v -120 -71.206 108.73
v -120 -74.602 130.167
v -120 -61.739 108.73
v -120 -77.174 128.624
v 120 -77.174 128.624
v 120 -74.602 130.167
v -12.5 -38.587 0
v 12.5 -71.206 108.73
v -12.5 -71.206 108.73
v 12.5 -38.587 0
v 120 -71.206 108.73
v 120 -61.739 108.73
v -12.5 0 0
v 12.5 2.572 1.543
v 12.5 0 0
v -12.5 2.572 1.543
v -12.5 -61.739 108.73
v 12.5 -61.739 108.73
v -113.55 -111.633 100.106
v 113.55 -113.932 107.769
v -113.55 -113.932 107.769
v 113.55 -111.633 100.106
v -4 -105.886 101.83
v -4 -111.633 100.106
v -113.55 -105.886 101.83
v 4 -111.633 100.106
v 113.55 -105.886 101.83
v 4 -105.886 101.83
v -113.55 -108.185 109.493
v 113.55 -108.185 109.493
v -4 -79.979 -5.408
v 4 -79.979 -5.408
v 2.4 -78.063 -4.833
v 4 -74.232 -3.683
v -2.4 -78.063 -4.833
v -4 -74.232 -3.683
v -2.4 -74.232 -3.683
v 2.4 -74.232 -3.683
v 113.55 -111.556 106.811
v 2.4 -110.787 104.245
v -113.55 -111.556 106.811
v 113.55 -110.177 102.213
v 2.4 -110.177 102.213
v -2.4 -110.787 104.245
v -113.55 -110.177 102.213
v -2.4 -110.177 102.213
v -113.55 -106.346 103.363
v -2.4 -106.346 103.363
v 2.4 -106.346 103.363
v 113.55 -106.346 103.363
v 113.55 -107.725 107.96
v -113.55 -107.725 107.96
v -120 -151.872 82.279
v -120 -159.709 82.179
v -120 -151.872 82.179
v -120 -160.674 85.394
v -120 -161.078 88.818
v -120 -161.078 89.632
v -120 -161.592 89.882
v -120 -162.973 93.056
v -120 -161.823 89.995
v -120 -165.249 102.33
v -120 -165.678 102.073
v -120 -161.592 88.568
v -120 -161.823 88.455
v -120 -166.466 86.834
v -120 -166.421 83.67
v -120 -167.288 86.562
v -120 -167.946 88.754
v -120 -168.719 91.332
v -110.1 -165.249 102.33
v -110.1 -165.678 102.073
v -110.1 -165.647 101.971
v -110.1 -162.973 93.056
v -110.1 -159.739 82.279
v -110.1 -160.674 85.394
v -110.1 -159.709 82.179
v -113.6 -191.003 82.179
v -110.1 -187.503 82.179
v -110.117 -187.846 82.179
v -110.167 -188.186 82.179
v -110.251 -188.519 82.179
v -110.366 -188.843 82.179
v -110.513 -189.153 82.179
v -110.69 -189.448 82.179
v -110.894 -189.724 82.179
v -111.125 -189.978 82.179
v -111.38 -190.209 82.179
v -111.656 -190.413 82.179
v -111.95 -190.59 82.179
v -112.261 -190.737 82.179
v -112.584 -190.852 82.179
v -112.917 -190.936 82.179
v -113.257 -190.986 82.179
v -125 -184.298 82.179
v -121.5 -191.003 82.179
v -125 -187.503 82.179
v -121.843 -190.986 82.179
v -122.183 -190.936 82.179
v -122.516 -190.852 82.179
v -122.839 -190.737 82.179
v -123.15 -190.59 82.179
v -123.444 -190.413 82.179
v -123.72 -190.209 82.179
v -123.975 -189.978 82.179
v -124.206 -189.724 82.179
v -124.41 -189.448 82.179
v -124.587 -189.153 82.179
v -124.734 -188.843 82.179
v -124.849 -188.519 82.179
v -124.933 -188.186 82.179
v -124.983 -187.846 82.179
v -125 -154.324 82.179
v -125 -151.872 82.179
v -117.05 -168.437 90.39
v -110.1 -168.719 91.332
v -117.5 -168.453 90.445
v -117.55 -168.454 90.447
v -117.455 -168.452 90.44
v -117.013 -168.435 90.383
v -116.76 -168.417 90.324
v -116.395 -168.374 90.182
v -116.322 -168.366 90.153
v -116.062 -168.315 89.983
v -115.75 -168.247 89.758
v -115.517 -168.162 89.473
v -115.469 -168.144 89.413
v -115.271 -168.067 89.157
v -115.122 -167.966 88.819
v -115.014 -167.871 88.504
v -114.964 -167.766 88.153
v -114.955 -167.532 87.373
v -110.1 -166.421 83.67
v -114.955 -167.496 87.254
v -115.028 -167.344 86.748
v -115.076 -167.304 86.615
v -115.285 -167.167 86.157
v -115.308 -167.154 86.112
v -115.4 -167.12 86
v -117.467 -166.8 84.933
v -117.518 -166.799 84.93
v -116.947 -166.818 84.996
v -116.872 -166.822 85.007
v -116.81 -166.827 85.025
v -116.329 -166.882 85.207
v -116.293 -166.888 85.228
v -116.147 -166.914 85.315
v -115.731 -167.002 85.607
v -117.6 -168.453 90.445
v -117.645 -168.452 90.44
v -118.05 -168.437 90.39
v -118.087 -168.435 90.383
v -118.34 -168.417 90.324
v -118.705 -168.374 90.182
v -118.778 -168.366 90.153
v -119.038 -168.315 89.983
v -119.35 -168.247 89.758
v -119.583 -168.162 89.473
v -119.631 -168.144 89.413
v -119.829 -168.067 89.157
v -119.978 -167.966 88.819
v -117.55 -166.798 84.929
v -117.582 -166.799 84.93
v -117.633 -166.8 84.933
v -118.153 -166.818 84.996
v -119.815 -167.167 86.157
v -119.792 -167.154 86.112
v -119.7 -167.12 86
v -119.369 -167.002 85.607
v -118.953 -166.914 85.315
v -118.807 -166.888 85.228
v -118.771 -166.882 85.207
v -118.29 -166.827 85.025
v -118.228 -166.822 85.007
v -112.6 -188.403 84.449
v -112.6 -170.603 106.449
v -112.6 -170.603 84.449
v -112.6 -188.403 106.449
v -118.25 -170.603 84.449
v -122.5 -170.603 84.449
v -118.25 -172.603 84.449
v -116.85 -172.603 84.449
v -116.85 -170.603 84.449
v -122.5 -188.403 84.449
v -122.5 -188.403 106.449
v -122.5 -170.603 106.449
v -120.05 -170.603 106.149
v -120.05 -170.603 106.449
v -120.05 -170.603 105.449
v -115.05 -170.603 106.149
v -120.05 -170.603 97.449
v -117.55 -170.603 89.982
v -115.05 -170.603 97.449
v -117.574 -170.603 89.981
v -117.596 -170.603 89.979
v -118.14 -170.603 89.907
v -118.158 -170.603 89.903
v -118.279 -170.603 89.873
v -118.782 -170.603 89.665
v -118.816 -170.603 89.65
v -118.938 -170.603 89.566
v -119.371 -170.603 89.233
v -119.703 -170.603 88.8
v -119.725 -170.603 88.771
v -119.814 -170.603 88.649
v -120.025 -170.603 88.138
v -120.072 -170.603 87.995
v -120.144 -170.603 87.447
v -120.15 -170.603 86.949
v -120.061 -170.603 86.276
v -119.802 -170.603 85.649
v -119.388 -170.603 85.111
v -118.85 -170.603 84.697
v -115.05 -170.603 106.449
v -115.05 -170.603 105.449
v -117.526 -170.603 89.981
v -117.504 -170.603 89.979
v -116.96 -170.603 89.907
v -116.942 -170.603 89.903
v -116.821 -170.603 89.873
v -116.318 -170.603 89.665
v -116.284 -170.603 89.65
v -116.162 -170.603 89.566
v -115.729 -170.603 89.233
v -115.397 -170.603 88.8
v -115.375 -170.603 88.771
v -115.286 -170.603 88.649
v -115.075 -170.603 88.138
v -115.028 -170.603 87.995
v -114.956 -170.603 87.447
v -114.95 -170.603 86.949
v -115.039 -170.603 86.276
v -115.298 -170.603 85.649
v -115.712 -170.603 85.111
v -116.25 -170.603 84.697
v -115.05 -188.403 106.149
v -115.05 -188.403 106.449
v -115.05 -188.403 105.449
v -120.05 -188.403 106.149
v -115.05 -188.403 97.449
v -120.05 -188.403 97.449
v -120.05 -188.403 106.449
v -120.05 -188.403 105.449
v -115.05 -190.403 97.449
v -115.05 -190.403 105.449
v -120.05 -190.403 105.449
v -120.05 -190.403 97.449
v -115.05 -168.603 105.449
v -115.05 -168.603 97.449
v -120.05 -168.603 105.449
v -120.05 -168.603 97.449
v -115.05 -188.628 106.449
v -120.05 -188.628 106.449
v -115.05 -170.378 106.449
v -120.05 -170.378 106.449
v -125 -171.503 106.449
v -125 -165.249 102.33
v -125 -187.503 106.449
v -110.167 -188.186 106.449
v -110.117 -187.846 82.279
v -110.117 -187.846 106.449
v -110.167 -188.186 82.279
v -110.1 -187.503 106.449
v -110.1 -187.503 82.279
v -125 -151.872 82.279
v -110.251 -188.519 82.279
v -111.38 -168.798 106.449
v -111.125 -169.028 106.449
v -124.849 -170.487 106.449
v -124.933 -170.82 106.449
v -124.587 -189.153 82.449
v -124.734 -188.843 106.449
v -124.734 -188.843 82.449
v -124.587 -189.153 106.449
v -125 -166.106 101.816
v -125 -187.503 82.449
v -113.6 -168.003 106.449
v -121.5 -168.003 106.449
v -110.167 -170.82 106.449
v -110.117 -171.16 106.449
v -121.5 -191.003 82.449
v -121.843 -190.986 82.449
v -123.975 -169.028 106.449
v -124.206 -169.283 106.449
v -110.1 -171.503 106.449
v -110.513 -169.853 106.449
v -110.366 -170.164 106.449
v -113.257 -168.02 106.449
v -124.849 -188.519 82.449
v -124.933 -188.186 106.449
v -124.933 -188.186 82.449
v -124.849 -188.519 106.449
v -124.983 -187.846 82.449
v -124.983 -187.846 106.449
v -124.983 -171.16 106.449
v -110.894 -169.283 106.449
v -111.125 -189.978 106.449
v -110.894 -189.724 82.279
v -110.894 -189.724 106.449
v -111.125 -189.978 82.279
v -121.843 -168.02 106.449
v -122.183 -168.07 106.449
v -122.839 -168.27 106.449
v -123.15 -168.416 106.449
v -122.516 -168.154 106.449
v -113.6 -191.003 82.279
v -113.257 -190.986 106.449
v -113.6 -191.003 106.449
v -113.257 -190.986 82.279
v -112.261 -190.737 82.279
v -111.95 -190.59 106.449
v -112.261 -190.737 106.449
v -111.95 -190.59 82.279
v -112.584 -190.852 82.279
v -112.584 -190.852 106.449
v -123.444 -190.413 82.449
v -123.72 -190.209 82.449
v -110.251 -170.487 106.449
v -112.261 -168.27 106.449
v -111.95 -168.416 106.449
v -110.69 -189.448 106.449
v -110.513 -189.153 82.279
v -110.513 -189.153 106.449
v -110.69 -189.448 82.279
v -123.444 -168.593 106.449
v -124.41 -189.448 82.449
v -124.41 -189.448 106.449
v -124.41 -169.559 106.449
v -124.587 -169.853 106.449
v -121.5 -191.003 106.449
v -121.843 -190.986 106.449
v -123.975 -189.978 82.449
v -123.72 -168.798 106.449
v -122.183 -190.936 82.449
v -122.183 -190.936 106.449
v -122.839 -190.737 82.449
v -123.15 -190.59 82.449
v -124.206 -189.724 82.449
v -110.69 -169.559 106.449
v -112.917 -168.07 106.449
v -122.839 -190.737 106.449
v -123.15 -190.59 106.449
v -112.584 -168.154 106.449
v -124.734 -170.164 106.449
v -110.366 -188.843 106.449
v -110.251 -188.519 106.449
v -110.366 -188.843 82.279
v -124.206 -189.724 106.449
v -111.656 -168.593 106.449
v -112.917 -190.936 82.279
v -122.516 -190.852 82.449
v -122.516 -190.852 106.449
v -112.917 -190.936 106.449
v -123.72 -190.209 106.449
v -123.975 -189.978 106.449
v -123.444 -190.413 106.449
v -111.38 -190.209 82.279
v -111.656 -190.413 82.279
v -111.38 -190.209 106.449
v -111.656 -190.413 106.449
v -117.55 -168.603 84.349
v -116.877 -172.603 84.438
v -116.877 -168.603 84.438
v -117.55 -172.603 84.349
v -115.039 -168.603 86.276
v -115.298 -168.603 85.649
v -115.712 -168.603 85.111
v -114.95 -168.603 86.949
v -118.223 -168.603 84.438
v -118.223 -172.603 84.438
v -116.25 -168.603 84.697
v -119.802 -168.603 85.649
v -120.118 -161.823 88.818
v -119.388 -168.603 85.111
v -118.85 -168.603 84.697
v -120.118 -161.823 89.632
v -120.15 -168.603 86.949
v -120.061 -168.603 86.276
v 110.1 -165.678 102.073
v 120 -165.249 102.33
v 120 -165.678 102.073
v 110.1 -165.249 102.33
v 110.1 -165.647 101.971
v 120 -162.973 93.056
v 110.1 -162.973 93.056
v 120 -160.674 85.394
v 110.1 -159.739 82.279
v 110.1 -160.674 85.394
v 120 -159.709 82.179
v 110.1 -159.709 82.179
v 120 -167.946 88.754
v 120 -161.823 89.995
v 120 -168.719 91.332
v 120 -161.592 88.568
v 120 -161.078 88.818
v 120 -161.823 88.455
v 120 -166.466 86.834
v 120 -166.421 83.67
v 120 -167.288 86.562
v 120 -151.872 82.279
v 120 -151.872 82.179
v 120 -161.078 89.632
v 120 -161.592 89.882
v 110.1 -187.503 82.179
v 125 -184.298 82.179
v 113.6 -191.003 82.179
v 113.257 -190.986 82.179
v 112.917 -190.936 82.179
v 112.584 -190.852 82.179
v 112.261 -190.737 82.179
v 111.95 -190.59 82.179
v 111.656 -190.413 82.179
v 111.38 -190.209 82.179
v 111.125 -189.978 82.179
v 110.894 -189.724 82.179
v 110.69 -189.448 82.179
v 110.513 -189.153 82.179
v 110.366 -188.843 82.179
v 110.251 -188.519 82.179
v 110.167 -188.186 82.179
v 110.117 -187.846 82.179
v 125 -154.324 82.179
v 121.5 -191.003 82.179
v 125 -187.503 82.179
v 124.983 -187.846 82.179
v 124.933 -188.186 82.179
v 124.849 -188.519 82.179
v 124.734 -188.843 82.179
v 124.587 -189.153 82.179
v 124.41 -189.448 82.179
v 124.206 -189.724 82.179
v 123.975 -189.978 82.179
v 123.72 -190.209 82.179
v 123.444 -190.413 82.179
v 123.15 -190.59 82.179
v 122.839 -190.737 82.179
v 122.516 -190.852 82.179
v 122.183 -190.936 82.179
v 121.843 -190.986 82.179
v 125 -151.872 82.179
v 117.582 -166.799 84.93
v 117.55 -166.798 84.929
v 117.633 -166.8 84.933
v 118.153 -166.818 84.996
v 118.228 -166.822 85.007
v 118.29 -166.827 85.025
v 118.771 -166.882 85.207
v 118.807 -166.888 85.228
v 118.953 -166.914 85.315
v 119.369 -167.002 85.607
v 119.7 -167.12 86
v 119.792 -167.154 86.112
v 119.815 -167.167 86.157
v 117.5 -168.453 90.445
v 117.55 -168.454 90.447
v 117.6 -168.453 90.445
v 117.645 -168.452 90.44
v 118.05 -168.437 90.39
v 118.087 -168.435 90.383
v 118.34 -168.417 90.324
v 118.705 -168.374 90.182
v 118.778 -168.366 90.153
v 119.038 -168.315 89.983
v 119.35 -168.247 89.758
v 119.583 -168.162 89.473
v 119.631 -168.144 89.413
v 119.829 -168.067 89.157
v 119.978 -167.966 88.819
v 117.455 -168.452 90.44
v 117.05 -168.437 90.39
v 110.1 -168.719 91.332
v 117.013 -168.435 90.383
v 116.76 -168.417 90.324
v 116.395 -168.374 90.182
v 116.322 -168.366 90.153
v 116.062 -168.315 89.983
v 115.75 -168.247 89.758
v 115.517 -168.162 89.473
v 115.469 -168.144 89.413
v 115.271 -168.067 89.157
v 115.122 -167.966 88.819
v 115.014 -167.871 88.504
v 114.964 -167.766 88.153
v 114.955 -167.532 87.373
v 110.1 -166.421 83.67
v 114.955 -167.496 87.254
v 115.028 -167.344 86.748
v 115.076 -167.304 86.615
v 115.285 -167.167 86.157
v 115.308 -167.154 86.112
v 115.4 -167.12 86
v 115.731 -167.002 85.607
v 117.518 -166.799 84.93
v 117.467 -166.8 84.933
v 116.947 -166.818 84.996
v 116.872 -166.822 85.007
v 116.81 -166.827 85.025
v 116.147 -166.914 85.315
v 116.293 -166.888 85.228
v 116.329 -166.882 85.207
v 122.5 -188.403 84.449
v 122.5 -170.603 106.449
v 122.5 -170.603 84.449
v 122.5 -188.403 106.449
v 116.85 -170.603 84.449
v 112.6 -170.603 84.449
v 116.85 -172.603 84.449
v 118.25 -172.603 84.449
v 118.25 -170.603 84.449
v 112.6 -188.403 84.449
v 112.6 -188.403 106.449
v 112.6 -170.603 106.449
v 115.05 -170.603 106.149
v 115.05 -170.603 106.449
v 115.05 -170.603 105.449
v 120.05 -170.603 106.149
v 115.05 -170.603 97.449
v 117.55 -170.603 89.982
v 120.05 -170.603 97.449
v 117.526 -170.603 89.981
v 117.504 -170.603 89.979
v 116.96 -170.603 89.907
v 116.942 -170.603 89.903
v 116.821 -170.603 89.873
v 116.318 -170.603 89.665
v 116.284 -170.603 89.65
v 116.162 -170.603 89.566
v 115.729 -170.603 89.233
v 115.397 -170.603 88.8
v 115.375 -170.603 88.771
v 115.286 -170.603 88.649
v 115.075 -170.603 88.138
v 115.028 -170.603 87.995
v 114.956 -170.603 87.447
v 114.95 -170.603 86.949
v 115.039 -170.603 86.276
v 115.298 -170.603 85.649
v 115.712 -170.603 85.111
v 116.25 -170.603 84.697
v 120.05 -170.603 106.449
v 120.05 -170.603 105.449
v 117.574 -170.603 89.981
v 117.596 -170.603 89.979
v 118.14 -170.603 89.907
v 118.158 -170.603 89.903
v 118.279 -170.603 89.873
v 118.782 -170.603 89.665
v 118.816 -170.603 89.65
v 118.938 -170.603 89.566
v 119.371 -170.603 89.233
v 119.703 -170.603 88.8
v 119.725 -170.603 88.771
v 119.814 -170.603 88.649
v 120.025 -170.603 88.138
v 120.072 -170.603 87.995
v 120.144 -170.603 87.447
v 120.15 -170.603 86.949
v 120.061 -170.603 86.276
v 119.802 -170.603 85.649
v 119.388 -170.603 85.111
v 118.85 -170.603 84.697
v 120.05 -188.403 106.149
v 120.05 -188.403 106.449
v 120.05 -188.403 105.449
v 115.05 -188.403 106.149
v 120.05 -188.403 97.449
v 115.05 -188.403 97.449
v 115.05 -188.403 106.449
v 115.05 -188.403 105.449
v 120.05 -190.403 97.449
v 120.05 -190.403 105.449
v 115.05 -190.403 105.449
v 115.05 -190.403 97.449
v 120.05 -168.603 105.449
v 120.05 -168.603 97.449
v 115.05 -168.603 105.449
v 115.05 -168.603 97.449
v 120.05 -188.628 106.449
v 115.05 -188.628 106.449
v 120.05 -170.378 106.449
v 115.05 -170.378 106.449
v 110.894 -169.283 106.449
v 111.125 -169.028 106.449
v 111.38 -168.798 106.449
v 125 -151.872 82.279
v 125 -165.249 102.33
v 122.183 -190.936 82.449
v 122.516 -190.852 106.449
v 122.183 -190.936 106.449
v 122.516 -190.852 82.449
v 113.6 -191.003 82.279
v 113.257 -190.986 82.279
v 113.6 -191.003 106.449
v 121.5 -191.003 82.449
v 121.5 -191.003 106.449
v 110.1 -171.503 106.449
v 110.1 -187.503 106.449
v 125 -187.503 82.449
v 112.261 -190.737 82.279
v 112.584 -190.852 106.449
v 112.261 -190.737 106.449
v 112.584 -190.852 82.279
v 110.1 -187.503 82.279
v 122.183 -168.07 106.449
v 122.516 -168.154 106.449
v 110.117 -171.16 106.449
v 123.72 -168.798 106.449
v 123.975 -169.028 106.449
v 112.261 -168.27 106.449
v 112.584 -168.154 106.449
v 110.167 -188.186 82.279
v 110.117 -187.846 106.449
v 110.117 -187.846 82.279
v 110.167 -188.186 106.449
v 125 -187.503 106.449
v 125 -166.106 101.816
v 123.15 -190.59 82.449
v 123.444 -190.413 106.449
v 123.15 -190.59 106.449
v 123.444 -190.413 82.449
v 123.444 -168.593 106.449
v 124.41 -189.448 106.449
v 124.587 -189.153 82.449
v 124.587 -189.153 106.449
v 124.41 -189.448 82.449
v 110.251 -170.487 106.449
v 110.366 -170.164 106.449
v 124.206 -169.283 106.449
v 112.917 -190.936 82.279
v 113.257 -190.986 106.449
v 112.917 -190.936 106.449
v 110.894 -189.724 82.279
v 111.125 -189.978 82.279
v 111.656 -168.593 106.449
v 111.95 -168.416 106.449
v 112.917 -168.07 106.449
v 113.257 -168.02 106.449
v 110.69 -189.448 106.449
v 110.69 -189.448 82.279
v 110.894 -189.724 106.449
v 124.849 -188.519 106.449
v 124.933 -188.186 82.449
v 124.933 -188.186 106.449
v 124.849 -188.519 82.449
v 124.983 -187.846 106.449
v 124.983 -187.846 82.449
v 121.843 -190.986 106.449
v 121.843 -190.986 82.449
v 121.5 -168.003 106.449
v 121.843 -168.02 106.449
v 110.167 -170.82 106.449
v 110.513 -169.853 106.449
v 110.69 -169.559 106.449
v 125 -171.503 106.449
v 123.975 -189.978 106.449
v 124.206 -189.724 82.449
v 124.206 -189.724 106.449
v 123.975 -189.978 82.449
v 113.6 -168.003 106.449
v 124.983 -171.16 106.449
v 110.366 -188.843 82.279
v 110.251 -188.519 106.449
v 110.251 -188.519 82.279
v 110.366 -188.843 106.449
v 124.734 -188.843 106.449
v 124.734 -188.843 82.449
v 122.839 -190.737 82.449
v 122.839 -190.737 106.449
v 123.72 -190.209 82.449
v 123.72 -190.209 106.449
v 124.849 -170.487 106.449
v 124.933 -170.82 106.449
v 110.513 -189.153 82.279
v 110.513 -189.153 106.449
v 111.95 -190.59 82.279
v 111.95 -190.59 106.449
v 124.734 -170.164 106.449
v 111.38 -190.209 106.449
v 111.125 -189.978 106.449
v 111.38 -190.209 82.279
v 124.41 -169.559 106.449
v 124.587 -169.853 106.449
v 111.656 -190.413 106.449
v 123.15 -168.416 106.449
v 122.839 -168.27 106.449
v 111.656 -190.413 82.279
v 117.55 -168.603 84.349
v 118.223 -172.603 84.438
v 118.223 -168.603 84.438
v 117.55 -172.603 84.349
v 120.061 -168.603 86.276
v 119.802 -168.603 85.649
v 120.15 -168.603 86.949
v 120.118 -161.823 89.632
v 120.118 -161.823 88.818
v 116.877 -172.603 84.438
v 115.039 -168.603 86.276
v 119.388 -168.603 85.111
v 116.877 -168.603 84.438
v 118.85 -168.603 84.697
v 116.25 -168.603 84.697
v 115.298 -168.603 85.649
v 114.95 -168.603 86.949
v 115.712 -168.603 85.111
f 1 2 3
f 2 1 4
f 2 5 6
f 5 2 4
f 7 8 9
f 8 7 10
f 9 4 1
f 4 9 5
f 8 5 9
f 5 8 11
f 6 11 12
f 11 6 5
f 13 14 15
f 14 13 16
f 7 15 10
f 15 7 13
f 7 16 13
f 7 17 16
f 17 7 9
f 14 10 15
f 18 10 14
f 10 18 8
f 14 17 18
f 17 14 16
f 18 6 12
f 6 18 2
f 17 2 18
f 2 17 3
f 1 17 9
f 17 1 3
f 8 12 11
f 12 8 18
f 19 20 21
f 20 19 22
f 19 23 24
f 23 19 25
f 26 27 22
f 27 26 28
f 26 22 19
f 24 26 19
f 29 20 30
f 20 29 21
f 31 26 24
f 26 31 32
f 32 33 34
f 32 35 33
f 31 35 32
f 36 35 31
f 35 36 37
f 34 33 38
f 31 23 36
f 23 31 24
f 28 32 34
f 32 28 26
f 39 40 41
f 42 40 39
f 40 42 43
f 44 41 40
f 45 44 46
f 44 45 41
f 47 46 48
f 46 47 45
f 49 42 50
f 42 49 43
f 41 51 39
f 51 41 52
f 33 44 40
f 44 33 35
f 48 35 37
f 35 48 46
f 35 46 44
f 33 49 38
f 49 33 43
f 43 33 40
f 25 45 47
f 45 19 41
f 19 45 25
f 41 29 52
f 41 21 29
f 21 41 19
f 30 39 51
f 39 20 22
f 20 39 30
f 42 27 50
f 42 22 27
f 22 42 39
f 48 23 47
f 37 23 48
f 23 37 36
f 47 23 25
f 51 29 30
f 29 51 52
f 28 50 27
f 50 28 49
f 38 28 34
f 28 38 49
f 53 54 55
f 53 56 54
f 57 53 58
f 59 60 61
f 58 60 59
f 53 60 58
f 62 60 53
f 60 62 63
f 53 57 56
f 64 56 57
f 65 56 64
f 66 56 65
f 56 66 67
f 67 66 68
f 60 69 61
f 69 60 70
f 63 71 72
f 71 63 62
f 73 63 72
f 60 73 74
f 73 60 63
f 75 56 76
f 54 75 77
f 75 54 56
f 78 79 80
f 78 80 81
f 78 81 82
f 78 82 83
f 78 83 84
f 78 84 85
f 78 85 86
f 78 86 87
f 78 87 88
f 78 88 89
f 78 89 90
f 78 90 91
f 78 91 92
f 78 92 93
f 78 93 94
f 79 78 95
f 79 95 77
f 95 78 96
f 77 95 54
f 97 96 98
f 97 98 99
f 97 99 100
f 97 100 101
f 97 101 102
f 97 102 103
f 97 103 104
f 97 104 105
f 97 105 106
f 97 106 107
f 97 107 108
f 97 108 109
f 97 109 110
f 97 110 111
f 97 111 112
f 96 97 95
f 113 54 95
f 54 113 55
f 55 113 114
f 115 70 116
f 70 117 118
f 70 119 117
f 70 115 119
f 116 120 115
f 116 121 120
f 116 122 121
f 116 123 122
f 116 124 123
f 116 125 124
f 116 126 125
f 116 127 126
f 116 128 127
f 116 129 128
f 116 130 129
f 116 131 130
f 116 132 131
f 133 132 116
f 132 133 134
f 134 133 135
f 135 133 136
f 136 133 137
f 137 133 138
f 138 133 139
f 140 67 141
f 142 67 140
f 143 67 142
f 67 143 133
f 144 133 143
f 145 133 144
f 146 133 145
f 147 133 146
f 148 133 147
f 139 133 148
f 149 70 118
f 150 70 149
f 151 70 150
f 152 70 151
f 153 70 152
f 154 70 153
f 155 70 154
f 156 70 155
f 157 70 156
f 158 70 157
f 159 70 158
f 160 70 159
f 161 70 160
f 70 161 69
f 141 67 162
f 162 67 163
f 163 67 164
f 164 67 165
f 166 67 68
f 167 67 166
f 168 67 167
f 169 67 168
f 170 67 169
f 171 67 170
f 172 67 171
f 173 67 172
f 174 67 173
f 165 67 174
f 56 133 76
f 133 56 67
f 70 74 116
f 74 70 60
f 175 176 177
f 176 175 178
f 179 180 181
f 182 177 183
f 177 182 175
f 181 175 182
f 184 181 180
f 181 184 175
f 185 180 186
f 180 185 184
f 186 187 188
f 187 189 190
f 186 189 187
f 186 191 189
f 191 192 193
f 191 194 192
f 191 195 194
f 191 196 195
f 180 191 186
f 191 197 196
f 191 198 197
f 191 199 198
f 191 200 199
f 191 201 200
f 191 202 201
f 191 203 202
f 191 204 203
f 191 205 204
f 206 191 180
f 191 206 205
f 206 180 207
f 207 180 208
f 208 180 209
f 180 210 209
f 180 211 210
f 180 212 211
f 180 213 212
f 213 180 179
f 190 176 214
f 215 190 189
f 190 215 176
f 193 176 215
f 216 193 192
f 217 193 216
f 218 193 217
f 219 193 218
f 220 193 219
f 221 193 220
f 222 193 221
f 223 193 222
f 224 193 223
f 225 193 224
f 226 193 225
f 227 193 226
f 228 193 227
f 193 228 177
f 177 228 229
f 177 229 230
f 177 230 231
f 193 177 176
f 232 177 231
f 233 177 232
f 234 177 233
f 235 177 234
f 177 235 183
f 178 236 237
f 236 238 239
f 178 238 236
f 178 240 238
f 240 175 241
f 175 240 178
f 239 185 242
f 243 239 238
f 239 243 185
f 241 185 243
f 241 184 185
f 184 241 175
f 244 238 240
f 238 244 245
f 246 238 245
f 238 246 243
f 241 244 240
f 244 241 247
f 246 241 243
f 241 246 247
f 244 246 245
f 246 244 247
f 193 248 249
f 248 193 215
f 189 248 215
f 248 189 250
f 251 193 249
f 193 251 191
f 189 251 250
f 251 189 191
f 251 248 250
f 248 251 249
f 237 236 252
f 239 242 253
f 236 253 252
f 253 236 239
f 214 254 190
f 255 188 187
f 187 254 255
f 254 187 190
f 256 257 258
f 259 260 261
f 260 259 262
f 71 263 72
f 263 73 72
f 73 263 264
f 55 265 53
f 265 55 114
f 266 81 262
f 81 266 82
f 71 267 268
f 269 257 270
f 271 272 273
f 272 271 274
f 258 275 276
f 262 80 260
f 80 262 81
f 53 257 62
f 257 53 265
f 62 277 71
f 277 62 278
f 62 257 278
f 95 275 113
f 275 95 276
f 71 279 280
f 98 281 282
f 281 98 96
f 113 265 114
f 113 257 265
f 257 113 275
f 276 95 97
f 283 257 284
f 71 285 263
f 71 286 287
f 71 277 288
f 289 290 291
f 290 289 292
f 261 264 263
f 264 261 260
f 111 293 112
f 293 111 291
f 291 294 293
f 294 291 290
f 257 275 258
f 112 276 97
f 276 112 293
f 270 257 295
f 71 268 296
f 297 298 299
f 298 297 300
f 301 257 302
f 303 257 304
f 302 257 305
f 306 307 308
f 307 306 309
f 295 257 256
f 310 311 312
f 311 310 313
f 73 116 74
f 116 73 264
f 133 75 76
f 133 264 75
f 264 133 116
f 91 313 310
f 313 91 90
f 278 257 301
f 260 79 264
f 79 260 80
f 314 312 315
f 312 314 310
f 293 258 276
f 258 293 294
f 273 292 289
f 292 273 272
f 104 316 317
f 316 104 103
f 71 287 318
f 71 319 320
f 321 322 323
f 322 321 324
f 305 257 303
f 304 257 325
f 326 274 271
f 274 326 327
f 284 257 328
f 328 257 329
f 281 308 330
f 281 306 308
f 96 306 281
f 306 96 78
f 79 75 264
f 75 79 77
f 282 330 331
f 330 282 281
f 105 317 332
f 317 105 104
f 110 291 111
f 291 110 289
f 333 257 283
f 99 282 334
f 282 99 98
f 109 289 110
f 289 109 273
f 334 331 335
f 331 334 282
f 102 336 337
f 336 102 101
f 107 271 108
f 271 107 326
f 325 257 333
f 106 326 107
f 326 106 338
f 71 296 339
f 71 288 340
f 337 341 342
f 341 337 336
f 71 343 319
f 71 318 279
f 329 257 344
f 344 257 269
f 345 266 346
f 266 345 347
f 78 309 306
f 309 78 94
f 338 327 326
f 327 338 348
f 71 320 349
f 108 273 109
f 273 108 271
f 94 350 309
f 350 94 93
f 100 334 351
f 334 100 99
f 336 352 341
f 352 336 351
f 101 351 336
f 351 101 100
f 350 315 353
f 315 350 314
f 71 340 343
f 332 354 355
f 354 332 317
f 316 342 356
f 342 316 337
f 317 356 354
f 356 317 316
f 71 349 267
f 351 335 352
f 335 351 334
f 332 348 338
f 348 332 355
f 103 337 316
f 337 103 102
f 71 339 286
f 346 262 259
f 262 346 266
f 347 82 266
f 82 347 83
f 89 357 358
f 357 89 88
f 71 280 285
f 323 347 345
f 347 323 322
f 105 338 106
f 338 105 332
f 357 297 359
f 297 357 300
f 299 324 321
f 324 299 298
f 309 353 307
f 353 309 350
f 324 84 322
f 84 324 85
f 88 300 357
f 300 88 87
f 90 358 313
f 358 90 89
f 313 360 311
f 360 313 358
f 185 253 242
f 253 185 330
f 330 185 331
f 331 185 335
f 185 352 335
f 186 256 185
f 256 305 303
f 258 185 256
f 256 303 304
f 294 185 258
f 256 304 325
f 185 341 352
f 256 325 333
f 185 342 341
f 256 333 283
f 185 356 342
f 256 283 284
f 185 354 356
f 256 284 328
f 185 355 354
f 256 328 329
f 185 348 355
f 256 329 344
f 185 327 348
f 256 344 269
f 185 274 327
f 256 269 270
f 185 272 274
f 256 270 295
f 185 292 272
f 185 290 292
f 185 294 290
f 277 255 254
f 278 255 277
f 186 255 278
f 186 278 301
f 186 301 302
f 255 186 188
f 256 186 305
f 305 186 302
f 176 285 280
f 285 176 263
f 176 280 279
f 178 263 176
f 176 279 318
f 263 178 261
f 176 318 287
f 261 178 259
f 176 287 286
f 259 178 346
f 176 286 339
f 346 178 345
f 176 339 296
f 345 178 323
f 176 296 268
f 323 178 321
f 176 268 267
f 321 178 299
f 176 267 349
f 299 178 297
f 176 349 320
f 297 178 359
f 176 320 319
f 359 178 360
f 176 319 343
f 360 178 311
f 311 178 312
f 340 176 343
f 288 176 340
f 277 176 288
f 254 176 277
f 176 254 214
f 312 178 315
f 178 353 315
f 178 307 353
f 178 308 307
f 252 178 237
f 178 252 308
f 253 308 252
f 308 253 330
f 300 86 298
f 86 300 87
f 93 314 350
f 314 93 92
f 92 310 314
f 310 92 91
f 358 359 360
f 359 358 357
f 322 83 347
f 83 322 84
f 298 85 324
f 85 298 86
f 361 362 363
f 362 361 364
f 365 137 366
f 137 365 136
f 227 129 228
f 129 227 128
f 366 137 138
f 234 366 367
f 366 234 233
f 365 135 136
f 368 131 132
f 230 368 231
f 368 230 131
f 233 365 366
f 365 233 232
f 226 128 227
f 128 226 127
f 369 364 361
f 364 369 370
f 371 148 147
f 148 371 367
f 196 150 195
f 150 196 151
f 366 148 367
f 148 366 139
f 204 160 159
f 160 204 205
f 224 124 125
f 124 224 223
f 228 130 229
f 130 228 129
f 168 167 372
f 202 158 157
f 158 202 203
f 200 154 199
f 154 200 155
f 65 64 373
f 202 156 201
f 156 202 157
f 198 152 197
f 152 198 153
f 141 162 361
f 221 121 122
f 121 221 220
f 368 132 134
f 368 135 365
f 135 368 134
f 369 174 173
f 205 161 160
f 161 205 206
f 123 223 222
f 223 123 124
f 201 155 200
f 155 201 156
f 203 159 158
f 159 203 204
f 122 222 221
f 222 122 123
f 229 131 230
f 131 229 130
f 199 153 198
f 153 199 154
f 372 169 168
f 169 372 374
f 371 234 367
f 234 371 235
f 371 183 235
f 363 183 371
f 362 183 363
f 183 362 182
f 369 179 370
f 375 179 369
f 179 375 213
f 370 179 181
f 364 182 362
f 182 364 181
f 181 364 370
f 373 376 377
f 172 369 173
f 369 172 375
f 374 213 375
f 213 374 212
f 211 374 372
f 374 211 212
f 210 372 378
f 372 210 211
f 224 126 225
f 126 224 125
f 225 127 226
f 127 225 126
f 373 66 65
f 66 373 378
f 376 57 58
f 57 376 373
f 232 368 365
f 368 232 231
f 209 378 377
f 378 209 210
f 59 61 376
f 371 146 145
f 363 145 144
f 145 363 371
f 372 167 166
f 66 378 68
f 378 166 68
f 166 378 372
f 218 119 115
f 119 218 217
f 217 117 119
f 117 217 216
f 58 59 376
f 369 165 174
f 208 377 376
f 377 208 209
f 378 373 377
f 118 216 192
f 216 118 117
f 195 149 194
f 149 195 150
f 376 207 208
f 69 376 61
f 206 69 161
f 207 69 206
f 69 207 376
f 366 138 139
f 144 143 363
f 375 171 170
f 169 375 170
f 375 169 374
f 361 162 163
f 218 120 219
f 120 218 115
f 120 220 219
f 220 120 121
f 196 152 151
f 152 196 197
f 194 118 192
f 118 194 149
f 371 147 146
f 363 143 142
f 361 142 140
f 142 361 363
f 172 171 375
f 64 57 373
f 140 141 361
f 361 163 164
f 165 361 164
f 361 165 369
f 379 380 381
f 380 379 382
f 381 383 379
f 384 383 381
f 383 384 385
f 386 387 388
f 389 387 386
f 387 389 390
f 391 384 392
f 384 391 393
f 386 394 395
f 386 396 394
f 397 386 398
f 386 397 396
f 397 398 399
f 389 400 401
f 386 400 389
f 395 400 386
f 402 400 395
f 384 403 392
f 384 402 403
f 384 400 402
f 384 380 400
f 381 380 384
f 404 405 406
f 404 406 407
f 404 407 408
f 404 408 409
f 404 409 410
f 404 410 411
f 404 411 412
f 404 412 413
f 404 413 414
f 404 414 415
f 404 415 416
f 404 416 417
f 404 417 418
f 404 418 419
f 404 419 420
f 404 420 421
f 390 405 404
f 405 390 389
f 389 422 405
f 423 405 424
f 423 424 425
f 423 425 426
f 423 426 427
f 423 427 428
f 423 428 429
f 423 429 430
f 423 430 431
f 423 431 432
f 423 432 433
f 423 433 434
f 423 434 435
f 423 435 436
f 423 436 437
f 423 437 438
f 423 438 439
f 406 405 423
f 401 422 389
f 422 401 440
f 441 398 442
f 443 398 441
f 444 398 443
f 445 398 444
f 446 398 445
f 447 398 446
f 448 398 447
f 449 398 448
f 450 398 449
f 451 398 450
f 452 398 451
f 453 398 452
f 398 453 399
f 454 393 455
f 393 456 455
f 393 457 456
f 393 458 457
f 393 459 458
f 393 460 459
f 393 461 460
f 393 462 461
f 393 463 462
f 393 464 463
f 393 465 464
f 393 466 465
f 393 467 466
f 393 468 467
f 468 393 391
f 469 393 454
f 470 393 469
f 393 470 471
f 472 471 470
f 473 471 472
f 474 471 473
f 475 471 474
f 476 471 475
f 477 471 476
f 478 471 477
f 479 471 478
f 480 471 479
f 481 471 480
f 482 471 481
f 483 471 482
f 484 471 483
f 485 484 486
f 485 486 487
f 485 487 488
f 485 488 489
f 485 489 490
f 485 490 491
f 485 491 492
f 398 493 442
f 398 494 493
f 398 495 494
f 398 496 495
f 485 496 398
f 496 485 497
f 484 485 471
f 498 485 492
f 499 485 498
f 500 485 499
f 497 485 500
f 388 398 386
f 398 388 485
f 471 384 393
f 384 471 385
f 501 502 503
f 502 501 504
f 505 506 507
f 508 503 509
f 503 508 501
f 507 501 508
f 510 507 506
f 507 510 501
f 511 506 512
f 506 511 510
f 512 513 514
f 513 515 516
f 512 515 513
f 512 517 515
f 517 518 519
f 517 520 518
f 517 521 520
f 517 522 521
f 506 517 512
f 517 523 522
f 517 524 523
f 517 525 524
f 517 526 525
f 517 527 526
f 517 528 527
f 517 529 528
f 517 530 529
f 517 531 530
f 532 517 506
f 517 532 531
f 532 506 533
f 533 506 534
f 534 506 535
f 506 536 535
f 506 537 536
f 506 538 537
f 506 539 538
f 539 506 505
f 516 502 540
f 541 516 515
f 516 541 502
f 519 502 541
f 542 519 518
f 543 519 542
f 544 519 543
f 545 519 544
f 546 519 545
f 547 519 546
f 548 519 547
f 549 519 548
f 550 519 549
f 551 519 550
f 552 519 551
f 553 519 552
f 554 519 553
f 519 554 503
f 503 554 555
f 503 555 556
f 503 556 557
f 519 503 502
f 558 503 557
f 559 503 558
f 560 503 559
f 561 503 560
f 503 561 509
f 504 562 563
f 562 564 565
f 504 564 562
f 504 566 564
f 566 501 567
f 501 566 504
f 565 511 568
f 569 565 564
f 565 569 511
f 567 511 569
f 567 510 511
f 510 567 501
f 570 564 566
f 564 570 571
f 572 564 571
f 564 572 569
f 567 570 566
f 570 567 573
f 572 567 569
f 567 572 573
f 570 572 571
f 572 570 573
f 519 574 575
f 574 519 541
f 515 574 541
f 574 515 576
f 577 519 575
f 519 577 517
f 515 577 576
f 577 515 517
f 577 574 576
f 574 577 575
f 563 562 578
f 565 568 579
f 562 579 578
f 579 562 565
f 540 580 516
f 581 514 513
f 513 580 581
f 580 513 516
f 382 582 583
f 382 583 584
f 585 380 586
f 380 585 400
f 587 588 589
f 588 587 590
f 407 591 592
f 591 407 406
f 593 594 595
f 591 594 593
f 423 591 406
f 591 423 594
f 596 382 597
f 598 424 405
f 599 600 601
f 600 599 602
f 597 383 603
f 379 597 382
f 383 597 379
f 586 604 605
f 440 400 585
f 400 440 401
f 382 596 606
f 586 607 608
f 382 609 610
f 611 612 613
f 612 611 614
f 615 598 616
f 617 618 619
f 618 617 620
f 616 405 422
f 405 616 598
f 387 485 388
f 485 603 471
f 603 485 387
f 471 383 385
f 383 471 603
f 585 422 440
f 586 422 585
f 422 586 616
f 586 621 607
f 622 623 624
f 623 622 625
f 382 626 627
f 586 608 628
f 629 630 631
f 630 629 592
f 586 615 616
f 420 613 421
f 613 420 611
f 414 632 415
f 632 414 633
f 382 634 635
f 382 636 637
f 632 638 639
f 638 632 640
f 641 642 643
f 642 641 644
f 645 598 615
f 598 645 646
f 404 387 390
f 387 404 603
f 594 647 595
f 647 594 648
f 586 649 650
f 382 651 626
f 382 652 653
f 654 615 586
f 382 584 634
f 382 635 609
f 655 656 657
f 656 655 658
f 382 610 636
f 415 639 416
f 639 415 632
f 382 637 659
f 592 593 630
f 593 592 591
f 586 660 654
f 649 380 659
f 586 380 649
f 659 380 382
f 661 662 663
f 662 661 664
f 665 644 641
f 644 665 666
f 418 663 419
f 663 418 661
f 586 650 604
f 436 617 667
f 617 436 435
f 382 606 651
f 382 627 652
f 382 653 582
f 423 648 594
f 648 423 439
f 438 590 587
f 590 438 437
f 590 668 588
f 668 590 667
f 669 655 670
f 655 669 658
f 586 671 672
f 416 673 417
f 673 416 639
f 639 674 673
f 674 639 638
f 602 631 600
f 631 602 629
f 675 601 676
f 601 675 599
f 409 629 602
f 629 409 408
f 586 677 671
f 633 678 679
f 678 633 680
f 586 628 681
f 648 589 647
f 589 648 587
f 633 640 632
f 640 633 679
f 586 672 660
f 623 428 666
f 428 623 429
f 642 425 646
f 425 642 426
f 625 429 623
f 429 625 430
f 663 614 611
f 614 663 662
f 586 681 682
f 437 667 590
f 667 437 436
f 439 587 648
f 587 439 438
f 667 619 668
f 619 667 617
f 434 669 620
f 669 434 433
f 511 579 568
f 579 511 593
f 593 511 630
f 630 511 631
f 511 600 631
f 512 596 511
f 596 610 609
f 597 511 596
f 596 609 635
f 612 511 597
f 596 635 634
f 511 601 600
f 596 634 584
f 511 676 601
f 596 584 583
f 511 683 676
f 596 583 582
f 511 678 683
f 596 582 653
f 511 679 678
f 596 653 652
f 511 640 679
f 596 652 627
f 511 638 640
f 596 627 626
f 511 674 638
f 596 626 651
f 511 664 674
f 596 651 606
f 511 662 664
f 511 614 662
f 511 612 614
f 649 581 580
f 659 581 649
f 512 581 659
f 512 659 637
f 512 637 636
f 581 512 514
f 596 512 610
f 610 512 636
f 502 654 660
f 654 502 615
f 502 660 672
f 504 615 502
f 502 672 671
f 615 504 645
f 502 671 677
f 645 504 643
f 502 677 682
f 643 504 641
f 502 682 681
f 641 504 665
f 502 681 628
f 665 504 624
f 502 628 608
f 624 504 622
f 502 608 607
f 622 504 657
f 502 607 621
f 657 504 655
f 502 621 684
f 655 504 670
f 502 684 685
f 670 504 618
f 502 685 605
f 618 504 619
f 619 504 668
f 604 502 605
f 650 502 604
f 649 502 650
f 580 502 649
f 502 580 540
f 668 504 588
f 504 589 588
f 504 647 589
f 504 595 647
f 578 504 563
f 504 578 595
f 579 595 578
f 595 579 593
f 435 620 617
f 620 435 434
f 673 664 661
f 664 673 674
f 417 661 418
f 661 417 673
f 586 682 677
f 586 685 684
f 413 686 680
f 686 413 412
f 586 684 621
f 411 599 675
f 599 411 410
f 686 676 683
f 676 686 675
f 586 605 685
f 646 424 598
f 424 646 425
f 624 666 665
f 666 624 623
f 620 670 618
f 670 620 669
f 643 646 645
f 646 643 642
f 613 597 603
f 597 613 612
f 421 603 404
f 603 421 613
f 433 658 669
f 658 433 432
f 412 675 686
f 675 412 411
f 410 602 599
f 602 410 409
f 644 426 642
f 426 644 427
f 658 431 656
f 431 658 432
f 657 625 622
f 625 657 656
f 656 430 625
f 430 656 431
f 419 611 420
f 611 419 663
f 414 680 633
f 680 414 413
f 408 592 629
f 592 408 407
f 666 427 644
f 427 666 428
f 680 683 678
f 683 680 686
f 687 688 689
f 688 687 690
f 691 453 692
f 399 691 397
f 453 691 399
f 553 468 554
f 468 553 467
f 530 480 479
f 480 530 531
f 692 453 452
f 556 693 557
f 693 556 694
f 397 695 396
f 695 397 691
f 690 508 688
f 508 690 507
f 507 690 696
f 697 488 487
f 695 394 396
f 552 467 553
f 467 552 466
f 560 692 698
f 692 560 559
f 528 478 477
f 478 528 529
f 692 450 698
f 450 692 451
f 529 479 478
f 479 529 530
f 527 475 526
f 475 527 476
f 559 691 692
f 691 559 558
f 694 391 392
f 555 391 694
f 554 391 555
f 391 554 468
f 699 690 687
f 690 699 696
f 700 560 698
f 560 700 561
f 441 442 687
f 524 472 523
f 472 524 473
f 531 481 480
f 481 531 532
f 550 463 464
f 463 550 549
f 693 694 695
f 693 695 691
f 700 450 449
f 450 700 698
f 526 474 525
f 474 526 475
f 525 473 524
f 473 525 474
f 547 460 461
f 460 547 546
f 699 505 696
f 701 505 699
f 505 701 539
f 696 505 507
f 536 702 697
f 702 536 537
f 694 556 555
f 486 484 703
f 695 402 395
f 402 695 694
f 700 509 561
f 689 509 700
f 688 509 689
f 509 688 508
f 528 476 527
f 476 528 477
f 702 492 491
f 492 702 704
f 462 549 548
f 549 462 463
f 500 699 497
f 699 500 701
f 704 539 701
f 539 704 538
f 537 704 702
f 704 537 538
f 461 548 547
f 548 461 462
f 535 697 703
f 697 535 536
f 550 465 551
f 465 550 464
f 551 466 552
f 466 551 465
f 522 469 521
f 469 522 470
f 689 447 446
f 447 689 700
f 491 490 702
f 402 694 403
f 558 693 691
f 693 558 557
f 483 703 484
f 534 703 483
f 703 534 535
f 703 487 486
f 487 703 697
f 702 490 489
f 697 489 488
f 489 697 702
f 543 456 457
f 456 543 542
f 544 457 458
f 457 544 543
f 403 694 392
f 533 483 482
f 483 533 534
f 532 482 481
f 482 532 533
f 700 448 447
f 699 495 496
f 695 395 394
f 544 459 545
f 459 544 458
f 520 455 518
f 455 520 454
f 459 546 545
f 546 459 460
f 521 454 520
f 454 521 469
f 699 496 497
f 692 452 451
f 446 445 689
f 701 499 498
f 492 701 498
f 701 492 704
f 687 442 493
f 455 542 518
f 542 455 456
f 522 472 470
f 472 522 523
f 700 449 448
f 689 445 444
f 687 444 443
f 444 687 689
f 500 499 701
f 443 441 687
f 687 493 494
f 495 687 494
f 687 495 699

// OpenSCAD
// T-shaped sign plate, 3 mm flat, with an angled kickstand brace.
// Wide T: horizontal cap 240 mm wide on top, 25 mm-wide stem hanging below.
// Bounding box 240 (W) × 150 (H); bar stroke 25 mm uniform.
// Symmetric about X = 0; bottom of stem sits at Y = 0.
//
// Brace: a solid wedge fused to the BACK of the plate that follows the whole T
// footprint — the same Y–Z tilt-wedge profile under the 25 mm stem for its full
// height AND under the 240 mm cap over the cap's own y-band, but never past the
// plate outline. Set the part down on the wedge's base and the T face stands at
// tilt_angle from horizontal. tilt_angle = atan(25/15) = 59.04°, matching the
// battery sunshade skirt's horizontal slope.

$fn = 64;

// ---- Plate parameters ----
thickness = 3;     // plate thickness (extrude depth)
width     = 240;   // overall horizontal span (top bar length)
height    = 150;   // overall vertical span (cap + stem)
stroke    = 25;    // bar width: cap height = stem width

// ---- Brace parameters ----
show_plate    = true;
show_brace    = true;
tilt_angle    = atan(25 / 15);       // 59.04° from horizontal (= shade skirt)
brace_len     = height;              // hypotenuse: stem bottom → cap top edge (150)
brace_overlap = 0.4;                 // sink the wedge underside into the plate for a clean union

// Wedge profiled in the model Y–Z plane:
//   A = stem bottom on the plate top   (y = 0,         z = thickness)
//   B = cap top edge on the plate top  (y = brace_len, z = thickness)  → hypotenuse A–B
//   F = apex; base A–F leaves the plate at tilt_angle (so the part still stands
//       at tilt_angle) and is brace_base long. brace_base is half the
//       right-triangle ground edge, so F–B is no longer perpendicular — the
//       triangle is intentionally not a right triangle. The wedge still tapers
//       to a sharp corner at A and B, spanning the full stem bottom → cap top.
brace_base = brace_len * cos(tilt_angle) / 2;          // ground (shortest) edge, halved → 38.6
foot_y     = brace_base * cos(tilt_angle);             // 19.9
foot_z     = thickness + brace_base * sin(tilt_angle); // 36.1

// ---- Plate ----
// 2D T outline, reused by the plate and by the brace's footprint clip.
module t_shape_2d() {
    union() {
        // top horizontal bar (cap), full width
        translate([-width / 2, height - stroke])
            square([width, stroke]);
        // vertical stem, full height (overlaps cap → robust union)
        translate([-stroke / 2, 0])
            square([stroke, height]);
    }
}

module t_sign() {
    linear_extrude(height = thickness) t_shape_2d();
}

// ---- Angled kickstand brace ----
// The Y–Z tilt-wedge profile, drawn in linear_extrude's own XY then mapped:
// polygon (a, b) → model (Z = a, Y = b); rotate([0,-90,0]) extrudes it along −X.
// The two extra points sink only the wedge's underside brace_overlap into the
// plate for a watertight union WITHOUT shortening the visible A→F→B triangle —
// its corners stay flush on the plate top.
//
// The prism is extruded across the FULL plate width and then intersected with
// the T footprint, so the wedge backs the entire T outline: the full triangle
// under the 25 mm stem, and the cap's y-band slice under the 240 mm cap. It
// never extends past the plate (only "as much as the plate is above it").
module brace() {
    intersection() {
        translate([width / 2, 0, 0])
            rotate([0, -90, 0])
                linear_extrude(height = width)
                    polygon([
                        [thickness - brace_overlap, 0],          // sunk base, stem-bottom end
                        [thickness,                 0],          // A  stem bottom, on plate top
                        [foot_z,                    foot_y],     // F  right-angle apex
                        [thickness,                 brace_len],  // B  cap top, on plate top
                        [thickness - brace_overlap, brace_len],  // sunk base, cap-top end
                    ]);
        // clip to the T footprint → support only directly under the plate
        linear_extrude(height = foot_z + 1) t_shape_2d();
    }
}

// Stand the part in its as-used pose: the A–F kickstand base face (the −Y-side
// wedge face) rests flat on Z = 0, so the T sign leans back at tilt_angle from
// the ground. Drop A onto the X-axis (translate −thickness in Z), then rotate
// about X by 180° − tilt_angle so the A–F face turns face-down onto Z = 0.
module place() {
    rotate([180 - tilt_angle, 0, 0])
        translate([0, 0, -thickness])
            children();
}

// ---- Cap underside flat (wings only; stem kept whole) ----
// The crossbar is a thin plate leaning at tilt_angle, so its underside is a slope.
// Shave that slope to a horizontal flat (parallel to Z=0) at cap_flat_z, but ONLY
// on the crossbar WINGS. The central stem-width column is left uncut, so the stem
// stays one continuous piece of plate running straight into the crossbar — it can
// never detach (same solid), and no gap/knife-edge can open at the join.
cap_flat_z = (height - stroke) * sin(tilt_angle) + thickness * cos(tilt_angle);

// The crossbar's y-band (local y ∈ [height-stroke, height]).
module cap_band() {
    translate([-width / 2, height - stroke, -1])
        cube([width, stroke, foot_z + 2]);
}

module sign_solid() {
    difference() {
        place() {
            if (show_plate) t_sign();
            if (show_brace) brace();
        }
        // Shave the WINGS only: (crossbar band − central stem column) below cap_flat_z.
        intersection() {
            difference() {
                place() cap_band();
                place() translate([-stroke / 2, height - stroke - 1, -foot_z])
                    cube([stroke, stroke + 2, 3 * foot_z]);
            }
            translate([-width, -width, cap_flat_z - 1000])
                cube([2 * width, 2 * width, 1000]);
        }
    }
}

// =====================================================================
// TWO SEPARATE PARTS: (1) the stand  = T sign + ㄷ wire cover, and
//                     (2) the USB holder ×2 (clip-on, its own colour).
// The holder is carved by the stand (difference) so it can NEVER overlap
// the plate/brace; `explode` lifts the holders off for the exploded view.
// =====================================================================

show_stand  = true;   // T sign  ("번호판 받침대")
show_holder = true;   // the two USB holders  (separate parts)
show_cover  = true;   // the wire cover  (separate ㄷ part)
explode     = 22;     // lift each detached part off the stand (0 = seated)

// ---- measured USB connector (the part that plugs INTO a holder) ----
usb_body    = [9.6, 17.5];   // body cross-section [W, L]
usb_depth   = 22;            // insertion depth
usb_flange  = [14.6, 23];    // top flange [W, L]
hook_w      = 4.6;           // snap-hook width
hook_proud  = 2;             // snap-hook free protrusion (hollow triangle, springy)

// ---- holder build params ----
clr         = 0.3;           // pocket clearance
wall        = 2.5;           // pocket wall
hook_wall   = 2.6;           // ±Y wall thickness — sized so the top's LONG side =
                             // pocket[1] + 2·hook_wall = 17.8 + 5.2 = 23 (matches flange)
hook_recess = 2.0;           // relief depth below the lip (into the 2.6 wall, ~0.6 skin):
                             // room for the latch to spring fully back out (≈ hook_proud)
hook_ledge  = 1;             // LIP thickness — the top hook_ledge mm of the ±Y walls stays
                             // TIGHT (the thin "panel" the latch grips) = flange→latch gap
hook_win_h  = 8;             // relief height below the lip (must clear the sprung latch)
chamf       = 0.3;           // small 45° lead-in on the lip's top edge (keeps the 1 mm lip)
r_top       = 3.5;           // rounding radius of the holder's top face corners
pocket = [usb_body[0] + clr, usb_body[1] + clr];   // 9.9 × 17.8

// ---- placement (socket pocket sits BEHIND the leaning crossbar) ----
usb_cx    = 125 - (pocket[0] + 2 * wall) / 2;   // holder OUTER ends 250 mm apart (end-to-end)
usb_rimZ  = 133;             // rim ABOVE the cap top edge
usb_cy    = -91;             // pocket centre — both thick end walls clear the plate
usb_floor = 2;
usb_baseZ = usb_rimZ - usb_depth - usb_floor;
sock_xw   = pocket[0] + 2 * wall;
sock_ymin = usb_cy - pocket[1] / 2 - hook_wall;   // −Y hook wall (thick)
sock_ymax = usb_cy + pocket[1] / 2 + hook_wall;   // +Y hook wall (thick, symmetric)

// ---- world mapping + vector helpers ----
tilt_rot = 180 - tilt_angle;
function W(x, y, z) = [ x,
    y * cos(tilt_rot) - (z - thickness) * sin(tilt_rot),
    y * sin(tilt_rot) + (z - thickness) * cos(tilt_rot) ];
function vlen(v)   = sqrt(v[0]*v[0] + v[1]*v[1] + v[2]*v[2]);
function unit(v)   = v / vlen(v);
function vdot(a,b) = a[0]*b[0] + a[1]*b[1] + a[2]*b[2];
function vcross(a,b) = [a[1]*b[2]-a[2]*b[1], a[2]*b[0]-a[0]*b[2], a[0]*b[1]-a[1]*b[0]];
function fb(s) = W(0, foot_y + s*(brace_len - foot_y), foot_z + s*(thickness - foot_z));
// local z of the brace's outer (F–B) face at stem position y (uniform across x)
function brace_top(y) = foot_z + (y - foot_y) * (thickness - foot_z) / (brace_len - foot_y);
nb = [0, -sin(tilt_angle), -cos(tilt_angle)];   // crossbar-back outward normal
nf = let (d = fb(1) - fb(0), n = vcross([1, 0, 0], d))
        (n[1] < 0 ? unit(n) : -unit(n));         // brace F–B face outward normal

// wire duct endpoints: pocket floor → out onto the brace's OUTER (F–B) back face,
// high enough (y=133) to be ABOVE the flat-cut underside. The cover sits ON this
// outermost surface and stands proud of it (never buried, never dangling below).
function duct_in(sx)  = [sx, usb_cy, usb_baseZ + 3];
function duct_out(sx) = W(sx, 137, brace_top(137));

// =============================== HOLDER ==============================
// 2D centred rounded rectangle (corner radius r) → the holder's rounded top face.
module rrect(w, d, r) {
    hull()
        for (ix = [-1, 1], iy = [-1, 1])
            translate([ix * (w / 2 - r), iy * (d / 2 - r)])
                circle(r = r);
}
module socket_boss(sx) {
    translate([sx, usb_cy, usb_baseZ])
        linear_extrude(usb_depth + usb_floor)
            rrect(sock_xw, sock_ymax - sock_ymin, r_top);
}
module socket_cavity(sx) {
    translate([sx, usb_cy, usb_rimZ]) {
        // body pocket (tight = body + clr). The top hook_ledge mm of the ±Y walls is
        // the LIP: the thin "panel" the connector's springy latch grips.
        translate([-pocket[0] / 2, -pocket[1] / 2, -usb_depth])
            cube([pocket[0], pocket[1], usb_depth + 1]);
        // PANEL-MOUNT catch on BOTH ±Y walls: BELOW the lip the wall is relieved, so
        // the latch — squeezed flush while it passes the tight lip — springs fully back
        // out here and its top catches UNDER the lip (grips it like a panel). Blind:
        // outer skin (hook_wall − hook_recess ≈ 0.6) stays.
        translate([-(hook_w + 0.4) / 2, -pocket[1] / 2 - hook_recess, -hook_ledge - hook_win_h])
            cube([hook_w + 0.4, hook_recess + 0.1, hook_win_h]);          // −Y relief
        translate([-(hook_w + 0.4) / 2, pocket[1] / 2 - 0.1, -hook_ledge - hook_win_h])
            cube([hook_w + 0.4, hook_recess + 0.1, hook_win_h]);          // +Y relief
        // 45° lead-in on each lip's TOP edge so the latch ramp starts camming instead
        // of butting the flat rim; the lip stays tight below it (mapping: polygon(a,b)
        // → model Z=a, Y=b; extrude along −X across the latch width).
        translate([(hook_w + 0.4) / 2, 0, 0]) rotate([0, -90, 0])
            linear_extrude(hook_w + 0.4)
                polygon([[0.1, -pocket[1]/2], [-chamf, -pocket[1]/2], [0.1, -pocket[1]/2 - chamf]]);
        translate([(hook_w + 0.4) / 2, 0, 0]) rotate([0, -90, 0])
            linear_extrude(hook_w + 0.4)
                polygon([[0.1, pocket[1]/2], [-chamf, pocket[1]/2], [0.1, pocket[1]/2 + chamf]]);
    }
}
// one holder: a smooth wedge from the vertical socket down to a flat pad on the
// crossbar back, then CARVED by the stand → the mating face follows the leaning
// plate exactly (full contact, no vertical step, no interference).
module holder_wedge(sx) {
    hull() {
        socket_boss(sx);
        place() translate([sx - sock_xw / 2, 124, thickness - 0.5])
            cube([sock_xw, 26, 1]);          // flat pad lying on the crossbar back
    }
}
module usb_holder(sx) {
    difference() {
        // wedge body PLUS a straight-down fill to the flat underside plane, so the
        // base cuts to ONE horizontal face instead of the wedge's natural slope.
        hull() {
            holder_wedge(sx);
            translate([0, 0, cap_flat_z])
                linear_extrude(0.1) projection() holder_wedge(sx);
        }
        socket_cavity(sx);
        // wire exit: a ROUND hole out the pocket's BACK (+Y) wall just above the
        // floor — keeps the pocket FLOOR clean (no teardrop) — then a tube to the
        // crossbar back, ending at the same round exit the cover collects from.
        hull() {
            translate([sx, usb_cy + pocket[1] / 2, usb_baseZ + usb_floor + 2.5])
                rotate([90, 0, 0]) cylinder(r = 2.6, h = 4, center = true, $fn = 24);
            translate(duct_out(sx)) sphere(2.6, $fn = 20);
        }
        sign_solid();               // mate to the sign
        cover_shells();             // clear the SOLID cover envelope (no channel void → no floating bit)
        // flat, floor-parallel bottom (horizontal cut at the crossbar's flat underside)
        translate([-500, -500, cap_flat_z - 500]) cube([1000, 1000, 500]);
    }
}

// =============================== COVER ===============================
ch_w = 8; ch_h = 6; ch_wall = 1.6; ch_base = 2;   // outer 8×6, wire channel 4.8 wide × 4 deep
emb = 0.3;                                         // minimal embed to fuse the walls (was coincident)
// A ㄷ cover laid ON a surface: shell minus channel. The walls sit ON the surface,
// the cap closes the OUTSIDE (+ez), the surface itself is the 4th wall → the wire
// is enclosed/covered. e0/e1 extend the P-end / Q-end (clean merges, no overshoot).
module ch_at(P, Q, U) {
    ex = unit(Q - P); ez = unit(U - ex * vdot(U, ex)); ey = vcross(ez, ex);
    multmatrix([[ex[0], ey[0], ez[0], P[0]],
                [ex[1], ey[1], ez[1], P[1]],
                [ex[2], ey[2], ez[2], P[2]],
                [0, 0, 0, 1]]) children();
}
module ch_shell(P, Q, U, e0, e1) {
    ch_at(P, Q, U)
        translate([-e0, -ch_w / 2, -emb]) cube([vlen(Q - P) + e0 + e1, ch_w, ch_h + emb]);
}
module ch_groove(P, Q, U, e0, e1) {
    ch_at(P, Q, U)
        translate([-e0 - 1, -(ch_w - 2*ch_wall) / 2, -emb - 0.1])
            cube([vlen(Q - P) + e0 + e1 + 2, ch_w - 2*ch_wall, ch_h - ch_base + emb + 0.1]);
}
// Cover matches the T: crossbar runs the FULL width (x = ±120) on the brace face
// (high enough to clear the flat-cut underside); the stem drops from the crossbar
// CENTRE all the way to the foot. They meet in a clean T (stem top closed in).
CB_P = W(-120, 137, brace_top(137)); CB_Q = W(120, 137, brace_top(137));
ST_P = duct_out(0);                  ST_Q = fb(0.05);   // stops just above the foot (stays ≥ Z 0)
module cover_shells() {
    ch_shell(CB_P, CB_Q, nf, 0, 0);
    ch_shell(ST_P, ST_Q, nf, 0, 0);
}
module cover_grooves() {
    ch_groove(CB_P, CB_Q, nf, 0, 0);
    ch_groove(ST_P, ST_Q, nf, 0, 0);
}
// Open the cap (back) over length Lo at the P/Q end of a run → wire can be laid in/out.
module cap_open(P, Q, U, from_p, from_q, Lo) {
    L = vlen(Q - P);
    ch_at(P, Q, U) {
        if (from_p) translate([-1, -ch_w / 2, ch_h - ch_base]) cube([Lo + 1, ch_w, ch_base + 1]);
        if (from_q) translate([L - Lo, -ch_w / 2, ch_h - ch_base]) cube([Lo + 1, ch_w, ch_base + 1]);
    }
}
// The wire cover is its OWN part: ㄷ shells − wire channel − open ends, underside
// carved to mate on the stand (seats with no overlap, lifts off cleanly).
module cover_part() {
    intersection() {
        difference() {
            cover_shells();
            cover_grooves();                         // channel open on the underside (stand side)
            // don't cover the holder wire holes: cut an opening (a bit bigger than the
            // hole) right over each holder's wire exit so the wire can come out.
            ch_at(CB_P, CB_Q, nf)
                for (s = [-1, 1])
                    translate([s * usb_cx + 120 - 4, -ch_w / 2 - 1, -2])
                        cube([8, ch_w + 2, ch_h + 4]);
        }
        // keep the +nf side of the brace F–B plane → one clean flat base (every wall
        // cut on the SAME plane, no knife edges, no half-cut walls)
        ch_at(CB_P, CB_Q, nf) translate([-500, -500, 0]) cube([1000, 1000, 1000]);
        // keep Z ≥ 0 → cover ends flush at the floor
        translate([-500, -500, 0]) cube([1000, 1000, 1000]);
    }
}

// ============================== ASSEMBLY =============================
// Three separate parts, shown exploded by default: stand (T sign), 2 USB holders,
// and the wire cover — each lifts off along its own mating normal.
module stand() { sign_solid(); }

// Exploded outward along the brace normal nf, in physical stack order:
// stand → cover (nearest the stand) → holder (furthest out, i.e. behind the cover).
if (show_stand)  stand();                                                    // yellow — T sign
if (show_cover)  color("Coral")  translate(1.6 * explode * nf) cover_part(); // coral  — wire cover (near stand)
if (show_holder) color("SteelBlue")
    for (s = [-1, 1]) translate(4.2 * explode * nf) usb_holder(s * usb_cx);  // blue   — USB holders (furthest)
